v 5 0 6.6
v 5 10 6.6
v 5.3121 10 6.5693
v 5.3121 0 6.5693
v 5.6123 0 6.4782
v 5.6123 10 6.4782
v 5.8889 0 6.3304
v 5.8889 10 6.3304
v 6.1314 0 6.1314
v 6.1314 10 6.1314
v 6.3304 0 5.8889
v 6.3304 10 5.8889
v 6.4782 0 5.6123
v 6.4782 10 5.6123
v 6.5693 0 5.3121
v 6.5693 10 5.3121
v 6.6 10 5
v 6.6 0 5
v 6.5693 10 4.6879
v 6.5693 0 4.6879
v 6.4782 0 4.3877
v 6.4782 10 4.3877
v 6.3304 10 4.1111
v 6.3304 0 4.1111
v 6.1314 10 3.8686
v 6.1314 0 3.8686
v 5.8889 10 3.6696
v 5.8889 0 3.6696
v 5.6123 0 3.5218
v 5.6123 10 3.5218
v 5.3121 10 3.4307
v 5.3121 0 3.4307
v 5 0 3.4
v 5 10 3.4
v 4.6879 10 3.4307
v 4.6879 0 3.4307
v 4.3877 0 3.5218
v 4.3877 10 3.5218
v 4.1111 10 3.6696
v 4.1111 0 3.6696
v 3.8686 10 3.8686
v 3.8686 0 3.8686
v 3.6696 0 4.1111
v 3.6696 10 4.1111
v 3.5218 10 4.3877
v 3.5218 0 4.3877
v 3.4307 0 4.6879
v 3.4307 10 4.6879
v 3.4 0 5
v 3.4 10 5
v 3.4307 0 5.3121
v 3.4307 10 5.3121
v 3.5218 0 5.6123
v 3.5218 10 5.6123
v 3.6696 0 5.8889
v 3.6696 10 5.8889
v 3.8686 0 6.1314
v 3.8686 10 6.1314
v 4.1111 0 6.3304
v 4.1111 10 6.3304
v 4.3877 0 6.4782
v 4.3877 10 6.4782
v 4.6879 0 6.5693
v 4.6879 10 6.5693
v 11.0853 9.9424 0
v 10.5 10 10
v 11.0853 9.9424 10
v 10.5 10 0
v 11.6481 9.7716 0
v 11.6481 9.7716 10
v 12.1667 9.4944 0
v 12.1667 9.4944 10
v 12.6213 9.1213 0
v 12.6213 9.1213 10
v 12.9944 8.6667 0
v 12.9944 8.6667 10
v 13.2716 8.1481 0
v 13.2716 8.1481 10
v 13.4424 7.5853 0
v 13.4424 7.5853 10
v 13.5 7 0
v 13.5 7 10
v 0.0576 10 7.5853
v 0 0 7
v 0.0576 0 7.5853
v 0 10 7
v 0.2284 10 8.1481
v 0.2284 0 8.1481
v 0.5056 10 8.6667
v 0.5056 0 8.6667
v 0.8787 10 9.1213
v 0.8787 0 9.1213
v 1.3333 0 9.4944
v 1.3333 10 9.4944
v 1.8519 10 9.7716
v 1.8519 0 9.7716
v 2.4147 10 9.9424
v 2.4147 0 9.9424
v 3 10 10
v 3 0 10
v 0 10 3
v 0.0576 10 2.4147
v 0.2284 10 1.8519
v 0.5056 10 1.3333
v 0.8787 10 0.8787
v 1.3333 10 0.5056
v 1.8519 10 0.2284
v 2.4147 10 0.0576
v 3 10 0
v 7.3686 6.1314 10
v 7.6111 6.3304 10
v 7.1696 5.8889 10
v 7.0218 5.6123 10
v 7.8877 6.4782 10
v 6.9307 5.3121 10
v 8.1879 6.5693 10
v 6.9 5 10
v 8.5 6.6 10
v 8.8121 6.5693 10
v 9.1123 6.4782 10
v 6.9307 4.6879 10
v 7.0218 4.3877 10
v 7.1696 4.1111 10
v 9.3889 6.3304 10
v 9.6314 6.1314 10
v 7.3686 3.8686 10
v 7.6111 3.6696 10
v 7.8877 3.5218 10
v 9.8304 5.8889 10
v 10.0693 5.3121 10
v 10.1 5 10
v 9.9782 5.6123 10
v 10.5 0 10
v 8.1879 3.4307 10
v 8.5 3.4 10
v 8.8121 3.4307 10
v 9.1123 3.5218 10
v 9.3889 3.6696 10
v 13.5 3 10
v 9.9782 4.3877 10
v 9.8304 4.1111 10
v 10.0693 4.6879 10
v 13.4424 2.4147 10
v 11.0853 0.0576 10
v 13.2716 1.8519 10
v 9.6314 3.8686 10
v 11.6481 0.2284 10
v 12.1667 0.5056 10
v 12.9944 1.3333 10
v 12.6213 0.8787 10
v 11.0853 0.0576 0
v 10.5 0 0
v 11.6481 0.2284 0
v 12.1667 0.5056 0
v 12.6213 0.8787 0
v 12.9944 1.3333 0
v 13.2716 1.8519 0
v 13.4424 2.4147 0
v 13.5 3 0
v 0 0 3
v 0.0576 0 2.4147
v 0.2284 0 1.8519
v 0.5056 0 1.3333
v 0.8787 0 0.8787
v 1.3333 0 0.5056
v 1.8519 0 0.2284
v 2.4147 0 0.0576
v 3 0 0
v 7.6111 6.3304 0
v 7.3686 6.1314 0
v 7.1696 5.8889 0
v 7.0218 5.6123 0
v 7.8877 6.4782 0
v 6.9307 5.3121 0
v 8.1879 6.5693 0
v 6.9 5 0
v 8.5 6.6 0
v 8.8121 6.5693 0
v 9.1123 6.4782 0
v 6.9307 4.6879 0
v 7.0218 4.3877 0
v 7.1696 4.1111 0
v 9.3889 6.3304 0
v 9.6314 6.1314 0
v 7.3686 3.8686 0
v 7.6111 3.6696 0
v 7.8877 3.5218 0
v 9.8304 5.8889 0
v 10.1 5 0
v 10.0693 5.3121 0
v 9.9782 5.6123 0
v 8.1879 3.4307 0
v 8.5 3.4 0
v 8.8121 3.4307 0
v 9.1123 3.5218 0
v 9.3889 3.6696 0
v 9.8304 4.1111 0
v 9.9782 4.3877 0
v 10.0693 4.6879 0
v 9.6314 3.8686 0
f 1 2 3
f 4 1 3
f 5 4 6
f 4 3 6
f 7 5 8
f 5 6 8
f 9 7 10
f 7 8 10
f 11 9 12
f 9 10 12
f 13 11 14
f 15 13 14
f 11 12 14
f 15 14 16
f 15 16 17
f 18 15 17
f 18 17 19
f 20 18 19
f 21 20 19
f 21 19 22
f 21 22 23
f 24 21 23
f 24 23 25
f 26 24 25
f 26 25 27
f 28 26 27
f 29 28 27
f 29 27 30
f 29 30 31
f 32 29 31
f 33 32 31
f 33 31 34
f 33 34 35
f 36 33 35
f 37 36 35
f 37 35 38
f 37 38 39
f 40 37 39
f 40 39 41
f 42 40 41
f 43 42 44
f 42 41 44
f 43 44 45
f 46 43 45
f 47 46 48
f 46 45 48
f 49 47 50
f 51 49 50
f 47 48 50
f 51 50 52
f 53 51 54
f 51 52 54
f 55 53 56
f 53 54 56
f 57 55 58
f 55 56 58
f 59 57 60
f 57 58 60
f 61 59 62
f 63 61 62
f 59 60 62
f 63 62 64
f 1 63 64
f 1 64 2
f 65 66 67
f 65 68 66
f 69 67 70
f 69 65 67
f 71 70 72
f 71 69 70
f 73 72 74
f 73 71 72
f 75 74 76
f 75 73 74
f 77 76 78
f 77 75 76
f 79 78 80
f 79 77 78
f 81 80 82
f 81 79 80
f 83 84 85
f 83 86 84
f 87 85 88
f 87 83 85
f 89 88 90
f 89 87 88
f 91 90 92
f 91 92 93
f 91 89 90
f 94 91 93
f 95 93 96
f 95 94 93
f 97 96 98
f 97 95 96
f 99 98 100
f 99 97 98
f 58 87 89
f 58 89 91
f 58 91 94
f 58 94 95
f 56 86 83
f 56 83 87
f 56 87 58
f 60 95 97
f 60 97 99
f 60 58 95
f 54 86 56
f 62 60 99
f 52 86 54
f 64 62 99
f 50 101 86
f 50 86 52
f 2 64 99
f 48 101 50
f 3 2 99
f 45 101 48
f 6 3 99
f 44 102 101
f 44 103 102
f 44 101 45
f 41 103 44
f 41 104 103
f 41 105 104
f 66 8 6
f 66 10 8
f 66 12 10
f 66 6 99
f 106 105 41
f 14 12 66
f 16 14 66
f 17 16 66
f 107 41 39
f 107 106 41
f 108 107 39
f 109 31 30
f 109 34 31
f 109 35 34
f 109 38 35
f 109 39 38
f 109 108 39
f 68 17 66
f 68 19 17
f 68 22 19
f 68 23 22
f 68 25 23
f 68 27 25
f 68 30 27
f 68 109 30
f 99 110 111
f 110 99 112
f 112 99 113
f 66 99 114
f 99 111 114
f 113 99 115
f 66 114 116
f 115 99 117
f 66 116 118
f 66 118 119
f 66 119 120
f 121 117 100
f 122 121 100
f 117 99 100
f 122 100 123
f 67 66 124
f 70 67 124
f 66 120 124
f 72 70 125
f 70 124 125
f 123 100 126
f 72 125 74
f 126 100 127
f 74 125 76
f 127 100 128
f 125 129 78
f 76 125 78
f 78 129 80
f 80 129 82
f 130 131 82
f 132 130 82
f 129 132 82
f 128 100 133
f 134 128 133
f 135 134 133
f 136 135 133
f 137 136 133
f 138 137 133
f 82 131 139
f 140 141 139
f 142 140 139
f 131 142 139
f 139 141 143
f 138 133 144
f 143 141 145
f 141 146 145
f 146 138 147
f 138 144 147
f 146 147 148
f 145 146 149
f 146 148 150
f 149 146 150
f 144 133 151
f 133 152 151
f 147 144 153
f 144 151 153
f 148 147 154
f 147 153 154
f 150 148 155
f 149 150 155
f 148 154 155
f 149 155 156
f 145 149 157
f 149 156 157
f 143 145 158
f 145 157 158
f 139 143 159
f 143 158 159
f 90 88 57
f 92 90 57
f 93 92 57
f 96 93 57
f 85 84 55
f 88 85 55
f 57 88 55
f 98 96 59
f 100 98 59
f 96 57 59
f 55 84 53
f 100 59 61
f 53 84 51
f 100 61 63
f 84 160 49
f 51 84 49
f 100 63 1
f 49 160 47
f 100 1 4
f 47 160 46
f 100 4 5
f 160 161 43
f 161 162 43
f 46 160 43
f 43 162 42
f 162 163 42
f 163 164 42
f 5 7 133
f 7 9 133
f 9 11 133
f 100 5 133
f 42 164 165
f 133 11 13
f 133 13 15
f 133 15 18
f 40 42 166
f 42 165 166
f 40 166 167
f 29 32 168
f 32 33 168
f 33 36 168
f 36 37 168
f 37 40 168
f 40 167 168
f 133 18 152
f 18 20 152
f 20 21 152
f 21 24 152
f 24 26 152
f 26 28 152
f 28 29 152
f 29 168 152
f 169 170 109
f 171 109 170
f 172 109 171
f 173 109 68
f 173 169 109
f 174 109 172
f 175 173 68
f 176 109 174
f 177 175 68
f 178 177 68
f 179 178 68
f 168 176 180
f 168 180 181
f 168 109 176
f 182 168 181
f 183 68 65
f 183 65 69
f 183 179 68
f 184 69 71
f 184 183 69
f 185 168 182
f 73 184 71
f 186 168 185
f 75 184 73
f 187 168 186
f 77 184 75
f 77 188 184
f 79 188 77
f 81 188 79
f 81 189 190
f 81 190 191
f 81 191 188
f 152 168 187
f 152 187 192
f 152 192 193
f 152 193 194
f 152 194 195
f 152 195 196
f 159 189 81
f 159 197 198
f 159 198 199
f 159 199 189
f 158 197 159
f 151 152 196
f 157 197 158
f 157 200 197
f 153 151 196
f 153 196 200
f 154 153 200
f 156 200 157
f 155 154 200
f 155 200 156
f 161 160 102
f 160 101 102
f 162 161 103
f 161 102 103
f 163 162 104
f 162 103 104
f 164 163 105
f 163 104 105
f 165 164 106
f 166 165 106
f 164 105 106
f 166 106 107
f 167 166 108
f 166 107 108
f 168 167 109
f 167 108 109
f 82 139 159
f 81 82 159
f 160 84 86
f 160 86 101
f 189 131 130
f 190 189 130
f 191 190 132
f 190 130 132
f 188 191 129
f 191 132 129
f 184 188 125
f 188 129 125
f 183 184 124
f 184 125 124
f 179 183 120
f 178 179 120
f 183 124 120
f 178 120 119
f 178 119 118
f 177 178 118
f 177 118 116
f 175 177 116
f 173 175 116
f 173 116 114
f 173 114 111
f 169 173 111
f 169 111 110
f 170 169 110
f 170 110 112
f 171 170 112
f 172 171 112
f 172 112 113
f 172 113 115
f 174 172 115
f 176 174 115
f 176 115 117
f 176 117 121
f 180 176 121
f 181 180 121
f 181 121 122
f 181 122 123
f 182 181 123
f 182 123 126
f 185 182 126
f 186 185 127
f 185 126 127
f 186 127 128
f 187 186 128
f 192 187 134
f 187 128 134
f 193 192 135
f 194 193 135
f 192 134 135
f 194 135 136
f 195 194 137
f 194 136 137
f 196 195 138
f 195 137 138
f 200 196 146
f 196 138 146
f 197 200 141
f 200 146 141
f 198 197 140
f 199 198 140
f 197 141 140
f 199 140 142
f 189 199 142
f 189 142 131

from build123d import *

# Parameters (mm, degrees)
SKETCH1_W           = 13.5
SKETCH1_H           = 10
BOSS_EXTRUDE1_DEPTH = 10
SKETCH2_R           = 1.6
CUT_EXTRUDE1_DEPTH  = 20.551214796
SKETCH3_R           = 1.6
CUT_EXTRUDE2_DEPTH  = 20.551214796
FILLET1_R           = 3


with BuildPart() as part:
    # Sketch1 → Boss-Extrude1 (new body)
    with BuildSketch(Plane(origin=(0, 0, 0), x_dir=(1, 0, 0), z_dir=(0, 1, 0))):
        with Locations((6.75, -5)):
            Rectangle(SKETCH1_W, SKETCH1_H)
    extrude(amount=BOSS_EXTRUDE1_DEPTH)

    # Sketch2 → Cut-Extrude1 (cut, through all)
    with BuildSketch(Plane.XY.offset(10)):
        with Locations((8.5, 5)):
            Circle(SKETCH2_R)
    extrude(amount=-CUT_EXTRUDE1_DEPTH, mode=Mode.SUBTRACT)

    # Sketch3 → Cut-Extrude2 (cut, through all)
    with BuildSketch(Plane(origin=(0, 10, 0), x_dir=(1, 0, 0), z_dir=(0, 1, 0))):
        with Locations(Location((5, -5, 0), (0, 0, 270))):
            Circle(SKETCH3_R)
    extrude(amount=-CUT_EXTRUDE2_DEPTH, mode=Mode.SUBTRACT)

    # Fillet1
    fillet1_edges = [part.edges().sort_by_distance(p)[0] for p in [
        (13.5, 10, 5),
        (13.5, 0, 5),
        (0, 5, 0),
        (0, 5, 10),
    ]]
    fillet(fillet1_edges, radius=FILLET1_R)


solid = part.part
